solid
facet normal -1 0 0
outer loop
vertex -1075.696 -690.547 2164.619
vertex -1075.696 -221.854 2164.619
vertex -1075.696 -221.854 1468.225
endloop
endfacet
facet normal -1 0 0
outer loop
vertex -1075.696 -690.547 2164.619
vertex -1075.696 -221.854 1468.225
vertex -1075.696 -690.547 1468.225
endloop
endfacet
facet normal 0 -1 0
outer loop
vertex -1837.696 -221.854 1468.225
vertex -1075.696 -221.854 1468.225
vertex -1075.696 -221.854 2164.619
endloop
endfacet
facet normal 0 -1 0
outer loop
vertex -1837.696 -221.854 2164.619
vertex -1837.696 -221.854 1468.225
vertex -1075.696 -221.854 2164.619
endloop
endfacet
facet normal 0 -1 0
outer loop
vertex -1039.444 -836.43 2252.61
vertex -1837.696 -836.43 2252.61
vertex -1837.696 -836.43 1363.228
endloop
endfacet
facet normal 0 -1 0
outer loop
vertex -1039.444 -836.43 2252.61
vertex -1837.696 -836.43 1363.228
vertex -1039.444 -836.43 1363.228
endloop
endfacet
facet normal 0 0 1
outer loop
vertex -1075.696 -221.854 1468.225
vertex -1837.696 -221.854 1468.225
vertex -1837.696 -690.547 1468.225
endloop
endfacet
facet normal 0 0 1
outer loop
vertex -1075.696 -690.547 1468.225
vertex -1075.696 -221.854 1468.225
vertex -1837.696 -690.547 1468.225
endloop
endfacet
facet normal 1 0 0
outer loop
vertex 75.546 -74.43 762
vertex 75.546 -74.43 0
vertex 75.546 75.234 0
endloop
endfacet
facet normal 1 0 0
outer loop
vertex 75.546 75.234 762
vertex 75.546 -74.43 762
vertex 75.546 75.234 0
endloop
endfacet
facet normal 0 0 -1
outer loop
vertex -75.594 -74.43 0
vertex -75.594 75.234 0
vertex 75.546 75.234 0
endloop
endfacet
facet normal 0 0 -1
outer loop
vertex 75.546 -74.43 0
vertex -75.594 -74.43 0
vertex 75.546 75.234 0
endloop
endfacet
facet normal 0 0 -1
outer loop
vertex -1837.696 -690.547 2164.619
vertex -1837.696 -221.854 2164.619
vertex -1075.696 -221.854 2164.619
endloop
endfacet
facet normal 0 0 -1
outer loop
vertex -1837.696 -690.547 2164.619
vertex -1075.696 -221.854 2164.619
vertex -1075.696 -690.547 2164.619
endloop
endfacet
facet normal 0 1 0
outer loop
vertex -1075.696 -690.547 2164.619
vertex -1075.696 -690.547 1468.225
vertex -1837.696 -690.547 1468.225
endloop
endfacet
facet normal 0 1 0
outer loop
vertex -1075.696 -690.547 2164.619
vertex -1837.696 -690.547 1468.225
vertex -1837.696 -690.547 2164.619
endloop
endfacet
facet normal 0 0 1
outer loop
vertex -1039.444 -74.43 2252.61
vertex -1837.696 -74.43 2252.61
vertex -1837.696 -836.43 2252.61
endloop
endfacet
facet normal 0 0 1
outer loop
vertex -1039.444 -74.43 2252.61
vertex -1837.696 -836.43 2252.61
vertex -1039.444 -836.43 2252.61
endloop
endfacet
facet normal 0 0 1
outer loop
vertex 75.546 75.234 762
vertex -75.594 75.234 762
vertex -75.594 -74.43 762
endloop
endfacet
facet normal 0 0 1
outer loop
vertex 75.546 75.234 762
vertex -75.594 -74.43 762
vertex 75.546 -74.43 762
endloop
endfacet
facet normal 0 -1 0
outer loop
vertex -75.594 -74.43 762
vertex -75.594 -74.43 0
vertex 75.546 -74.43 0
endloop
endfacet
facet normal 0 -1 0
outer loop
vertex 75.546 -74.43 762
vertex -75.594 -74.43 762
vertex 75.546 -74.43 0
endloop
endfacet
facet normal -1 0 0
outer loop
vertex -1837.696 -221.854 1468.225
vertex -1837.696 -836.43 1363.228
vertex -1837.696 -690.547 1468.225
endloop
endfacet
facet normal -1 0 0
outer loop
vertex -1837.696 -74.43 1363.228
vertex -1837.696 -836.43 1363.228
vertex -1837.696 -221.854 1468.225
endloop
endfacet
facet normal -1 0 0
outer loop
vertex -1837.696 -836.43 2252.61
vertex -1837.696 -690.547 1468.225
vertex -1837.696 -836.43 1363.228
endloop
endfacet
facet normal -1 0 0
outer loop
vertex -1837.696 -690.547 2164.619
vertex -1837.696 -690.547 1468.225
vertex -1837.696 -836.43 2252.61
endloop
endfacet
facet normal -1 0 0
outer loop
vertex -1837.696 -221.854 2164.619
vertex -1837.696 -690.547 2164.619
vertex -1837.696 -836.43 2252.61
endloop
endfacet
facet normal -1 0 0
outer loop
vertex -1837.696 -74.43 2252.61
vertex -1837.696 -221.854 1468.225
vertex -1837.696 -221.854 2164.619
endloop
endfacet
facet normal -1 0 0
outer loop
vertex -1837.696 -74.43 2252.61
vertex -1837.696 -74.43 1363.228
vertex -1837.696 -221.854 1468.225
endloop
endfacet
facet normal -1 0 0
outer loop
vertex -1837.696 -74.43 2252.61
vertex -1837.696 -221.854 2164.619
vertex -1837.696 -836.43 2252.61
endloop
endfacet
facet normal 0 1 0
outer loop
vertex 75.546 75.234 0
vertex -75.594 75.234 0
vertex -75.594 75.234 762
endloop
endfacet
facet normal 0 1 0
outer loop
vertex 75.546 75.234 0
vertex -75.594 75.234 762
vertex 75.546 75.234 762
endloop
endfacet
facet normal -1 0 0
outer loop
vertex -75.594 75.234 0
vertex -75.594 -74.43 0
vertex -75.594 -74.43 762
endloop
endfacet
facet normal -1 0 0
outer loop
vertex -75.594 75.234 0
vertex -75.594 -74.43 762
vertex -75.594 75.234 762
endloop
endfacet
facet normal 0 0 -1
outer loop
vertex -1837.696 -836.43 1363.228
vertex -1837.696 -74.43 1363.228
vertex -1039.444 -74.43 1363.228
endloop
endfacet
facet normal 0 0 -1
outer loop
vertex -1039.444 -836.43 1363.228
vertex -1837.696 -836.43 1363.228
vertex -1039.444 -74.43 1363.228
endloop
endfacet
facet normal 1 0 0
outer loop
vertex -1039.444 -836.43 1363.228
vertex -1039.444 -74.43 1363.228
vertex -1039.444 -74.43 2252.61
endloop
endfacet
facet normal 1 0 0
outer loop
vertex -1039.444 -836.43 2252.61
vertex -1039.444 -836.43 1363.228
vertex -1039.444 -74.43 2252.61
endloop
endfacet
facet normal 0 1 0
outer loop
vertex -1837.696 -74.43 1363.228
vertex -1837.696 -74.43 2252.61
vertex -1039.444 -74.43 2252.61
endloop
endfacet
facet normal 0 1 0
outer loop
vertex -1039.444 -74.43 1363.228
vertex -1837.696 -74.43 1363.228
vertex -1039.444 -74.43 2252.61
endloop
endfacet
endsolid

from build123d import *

# Parameters (mm, degrees)
F0_W     = 151.1403471231
F0_H     = 149.6643647552
F1_DEPTH = 762
F6_W     = 798.2519865036
F6_H     = 889.3822431564
F7_DEPTH = 762
F8_W     = 468.693330884
F8_H     = 696.3945627213
F9_DEPTH = 762


# Not quite as in the source:
# - the program builds the solid bodies; features that only make, move or delete a surface that nothing else refers to are left out


with BuildPart() as f1:
    # F0 (on Top) → F1 (new body)
    with BuildSketch(Plane.XY):
        with Locations((-0.0241398811, 0.4020892084)):
            Rectangle(F0_W, F0_H)
    extrude(amount=F1_DEPTH)


with BuildPart() as f7:
    # F6 (on face) → F7 (new body)
    with BuildSketch(Plane.XZ.offset(74.4300931692)):
        with Locations((-1438.5702013969, 1807.9190850258)):
            Rectangle(F6_W, F6_H)
    extrude(amount=F7_DEPTH)

    # F8 (on face) → F9 (cut)
    with BuildSketch(Plane(origin=(-1837.6961946487, 0, 0), x_dir=(0, -1, 0), z_dir=(-1, 0, 0))):
        with Locations((456.2002047896, 1816.4219260216)):
            Rectangle(F8_W, F8_H)
    extrude(amount=-F9_DEPTH, mode=Mode.SUBTRACT)


solid = Compound([f1.part, f7.part])
